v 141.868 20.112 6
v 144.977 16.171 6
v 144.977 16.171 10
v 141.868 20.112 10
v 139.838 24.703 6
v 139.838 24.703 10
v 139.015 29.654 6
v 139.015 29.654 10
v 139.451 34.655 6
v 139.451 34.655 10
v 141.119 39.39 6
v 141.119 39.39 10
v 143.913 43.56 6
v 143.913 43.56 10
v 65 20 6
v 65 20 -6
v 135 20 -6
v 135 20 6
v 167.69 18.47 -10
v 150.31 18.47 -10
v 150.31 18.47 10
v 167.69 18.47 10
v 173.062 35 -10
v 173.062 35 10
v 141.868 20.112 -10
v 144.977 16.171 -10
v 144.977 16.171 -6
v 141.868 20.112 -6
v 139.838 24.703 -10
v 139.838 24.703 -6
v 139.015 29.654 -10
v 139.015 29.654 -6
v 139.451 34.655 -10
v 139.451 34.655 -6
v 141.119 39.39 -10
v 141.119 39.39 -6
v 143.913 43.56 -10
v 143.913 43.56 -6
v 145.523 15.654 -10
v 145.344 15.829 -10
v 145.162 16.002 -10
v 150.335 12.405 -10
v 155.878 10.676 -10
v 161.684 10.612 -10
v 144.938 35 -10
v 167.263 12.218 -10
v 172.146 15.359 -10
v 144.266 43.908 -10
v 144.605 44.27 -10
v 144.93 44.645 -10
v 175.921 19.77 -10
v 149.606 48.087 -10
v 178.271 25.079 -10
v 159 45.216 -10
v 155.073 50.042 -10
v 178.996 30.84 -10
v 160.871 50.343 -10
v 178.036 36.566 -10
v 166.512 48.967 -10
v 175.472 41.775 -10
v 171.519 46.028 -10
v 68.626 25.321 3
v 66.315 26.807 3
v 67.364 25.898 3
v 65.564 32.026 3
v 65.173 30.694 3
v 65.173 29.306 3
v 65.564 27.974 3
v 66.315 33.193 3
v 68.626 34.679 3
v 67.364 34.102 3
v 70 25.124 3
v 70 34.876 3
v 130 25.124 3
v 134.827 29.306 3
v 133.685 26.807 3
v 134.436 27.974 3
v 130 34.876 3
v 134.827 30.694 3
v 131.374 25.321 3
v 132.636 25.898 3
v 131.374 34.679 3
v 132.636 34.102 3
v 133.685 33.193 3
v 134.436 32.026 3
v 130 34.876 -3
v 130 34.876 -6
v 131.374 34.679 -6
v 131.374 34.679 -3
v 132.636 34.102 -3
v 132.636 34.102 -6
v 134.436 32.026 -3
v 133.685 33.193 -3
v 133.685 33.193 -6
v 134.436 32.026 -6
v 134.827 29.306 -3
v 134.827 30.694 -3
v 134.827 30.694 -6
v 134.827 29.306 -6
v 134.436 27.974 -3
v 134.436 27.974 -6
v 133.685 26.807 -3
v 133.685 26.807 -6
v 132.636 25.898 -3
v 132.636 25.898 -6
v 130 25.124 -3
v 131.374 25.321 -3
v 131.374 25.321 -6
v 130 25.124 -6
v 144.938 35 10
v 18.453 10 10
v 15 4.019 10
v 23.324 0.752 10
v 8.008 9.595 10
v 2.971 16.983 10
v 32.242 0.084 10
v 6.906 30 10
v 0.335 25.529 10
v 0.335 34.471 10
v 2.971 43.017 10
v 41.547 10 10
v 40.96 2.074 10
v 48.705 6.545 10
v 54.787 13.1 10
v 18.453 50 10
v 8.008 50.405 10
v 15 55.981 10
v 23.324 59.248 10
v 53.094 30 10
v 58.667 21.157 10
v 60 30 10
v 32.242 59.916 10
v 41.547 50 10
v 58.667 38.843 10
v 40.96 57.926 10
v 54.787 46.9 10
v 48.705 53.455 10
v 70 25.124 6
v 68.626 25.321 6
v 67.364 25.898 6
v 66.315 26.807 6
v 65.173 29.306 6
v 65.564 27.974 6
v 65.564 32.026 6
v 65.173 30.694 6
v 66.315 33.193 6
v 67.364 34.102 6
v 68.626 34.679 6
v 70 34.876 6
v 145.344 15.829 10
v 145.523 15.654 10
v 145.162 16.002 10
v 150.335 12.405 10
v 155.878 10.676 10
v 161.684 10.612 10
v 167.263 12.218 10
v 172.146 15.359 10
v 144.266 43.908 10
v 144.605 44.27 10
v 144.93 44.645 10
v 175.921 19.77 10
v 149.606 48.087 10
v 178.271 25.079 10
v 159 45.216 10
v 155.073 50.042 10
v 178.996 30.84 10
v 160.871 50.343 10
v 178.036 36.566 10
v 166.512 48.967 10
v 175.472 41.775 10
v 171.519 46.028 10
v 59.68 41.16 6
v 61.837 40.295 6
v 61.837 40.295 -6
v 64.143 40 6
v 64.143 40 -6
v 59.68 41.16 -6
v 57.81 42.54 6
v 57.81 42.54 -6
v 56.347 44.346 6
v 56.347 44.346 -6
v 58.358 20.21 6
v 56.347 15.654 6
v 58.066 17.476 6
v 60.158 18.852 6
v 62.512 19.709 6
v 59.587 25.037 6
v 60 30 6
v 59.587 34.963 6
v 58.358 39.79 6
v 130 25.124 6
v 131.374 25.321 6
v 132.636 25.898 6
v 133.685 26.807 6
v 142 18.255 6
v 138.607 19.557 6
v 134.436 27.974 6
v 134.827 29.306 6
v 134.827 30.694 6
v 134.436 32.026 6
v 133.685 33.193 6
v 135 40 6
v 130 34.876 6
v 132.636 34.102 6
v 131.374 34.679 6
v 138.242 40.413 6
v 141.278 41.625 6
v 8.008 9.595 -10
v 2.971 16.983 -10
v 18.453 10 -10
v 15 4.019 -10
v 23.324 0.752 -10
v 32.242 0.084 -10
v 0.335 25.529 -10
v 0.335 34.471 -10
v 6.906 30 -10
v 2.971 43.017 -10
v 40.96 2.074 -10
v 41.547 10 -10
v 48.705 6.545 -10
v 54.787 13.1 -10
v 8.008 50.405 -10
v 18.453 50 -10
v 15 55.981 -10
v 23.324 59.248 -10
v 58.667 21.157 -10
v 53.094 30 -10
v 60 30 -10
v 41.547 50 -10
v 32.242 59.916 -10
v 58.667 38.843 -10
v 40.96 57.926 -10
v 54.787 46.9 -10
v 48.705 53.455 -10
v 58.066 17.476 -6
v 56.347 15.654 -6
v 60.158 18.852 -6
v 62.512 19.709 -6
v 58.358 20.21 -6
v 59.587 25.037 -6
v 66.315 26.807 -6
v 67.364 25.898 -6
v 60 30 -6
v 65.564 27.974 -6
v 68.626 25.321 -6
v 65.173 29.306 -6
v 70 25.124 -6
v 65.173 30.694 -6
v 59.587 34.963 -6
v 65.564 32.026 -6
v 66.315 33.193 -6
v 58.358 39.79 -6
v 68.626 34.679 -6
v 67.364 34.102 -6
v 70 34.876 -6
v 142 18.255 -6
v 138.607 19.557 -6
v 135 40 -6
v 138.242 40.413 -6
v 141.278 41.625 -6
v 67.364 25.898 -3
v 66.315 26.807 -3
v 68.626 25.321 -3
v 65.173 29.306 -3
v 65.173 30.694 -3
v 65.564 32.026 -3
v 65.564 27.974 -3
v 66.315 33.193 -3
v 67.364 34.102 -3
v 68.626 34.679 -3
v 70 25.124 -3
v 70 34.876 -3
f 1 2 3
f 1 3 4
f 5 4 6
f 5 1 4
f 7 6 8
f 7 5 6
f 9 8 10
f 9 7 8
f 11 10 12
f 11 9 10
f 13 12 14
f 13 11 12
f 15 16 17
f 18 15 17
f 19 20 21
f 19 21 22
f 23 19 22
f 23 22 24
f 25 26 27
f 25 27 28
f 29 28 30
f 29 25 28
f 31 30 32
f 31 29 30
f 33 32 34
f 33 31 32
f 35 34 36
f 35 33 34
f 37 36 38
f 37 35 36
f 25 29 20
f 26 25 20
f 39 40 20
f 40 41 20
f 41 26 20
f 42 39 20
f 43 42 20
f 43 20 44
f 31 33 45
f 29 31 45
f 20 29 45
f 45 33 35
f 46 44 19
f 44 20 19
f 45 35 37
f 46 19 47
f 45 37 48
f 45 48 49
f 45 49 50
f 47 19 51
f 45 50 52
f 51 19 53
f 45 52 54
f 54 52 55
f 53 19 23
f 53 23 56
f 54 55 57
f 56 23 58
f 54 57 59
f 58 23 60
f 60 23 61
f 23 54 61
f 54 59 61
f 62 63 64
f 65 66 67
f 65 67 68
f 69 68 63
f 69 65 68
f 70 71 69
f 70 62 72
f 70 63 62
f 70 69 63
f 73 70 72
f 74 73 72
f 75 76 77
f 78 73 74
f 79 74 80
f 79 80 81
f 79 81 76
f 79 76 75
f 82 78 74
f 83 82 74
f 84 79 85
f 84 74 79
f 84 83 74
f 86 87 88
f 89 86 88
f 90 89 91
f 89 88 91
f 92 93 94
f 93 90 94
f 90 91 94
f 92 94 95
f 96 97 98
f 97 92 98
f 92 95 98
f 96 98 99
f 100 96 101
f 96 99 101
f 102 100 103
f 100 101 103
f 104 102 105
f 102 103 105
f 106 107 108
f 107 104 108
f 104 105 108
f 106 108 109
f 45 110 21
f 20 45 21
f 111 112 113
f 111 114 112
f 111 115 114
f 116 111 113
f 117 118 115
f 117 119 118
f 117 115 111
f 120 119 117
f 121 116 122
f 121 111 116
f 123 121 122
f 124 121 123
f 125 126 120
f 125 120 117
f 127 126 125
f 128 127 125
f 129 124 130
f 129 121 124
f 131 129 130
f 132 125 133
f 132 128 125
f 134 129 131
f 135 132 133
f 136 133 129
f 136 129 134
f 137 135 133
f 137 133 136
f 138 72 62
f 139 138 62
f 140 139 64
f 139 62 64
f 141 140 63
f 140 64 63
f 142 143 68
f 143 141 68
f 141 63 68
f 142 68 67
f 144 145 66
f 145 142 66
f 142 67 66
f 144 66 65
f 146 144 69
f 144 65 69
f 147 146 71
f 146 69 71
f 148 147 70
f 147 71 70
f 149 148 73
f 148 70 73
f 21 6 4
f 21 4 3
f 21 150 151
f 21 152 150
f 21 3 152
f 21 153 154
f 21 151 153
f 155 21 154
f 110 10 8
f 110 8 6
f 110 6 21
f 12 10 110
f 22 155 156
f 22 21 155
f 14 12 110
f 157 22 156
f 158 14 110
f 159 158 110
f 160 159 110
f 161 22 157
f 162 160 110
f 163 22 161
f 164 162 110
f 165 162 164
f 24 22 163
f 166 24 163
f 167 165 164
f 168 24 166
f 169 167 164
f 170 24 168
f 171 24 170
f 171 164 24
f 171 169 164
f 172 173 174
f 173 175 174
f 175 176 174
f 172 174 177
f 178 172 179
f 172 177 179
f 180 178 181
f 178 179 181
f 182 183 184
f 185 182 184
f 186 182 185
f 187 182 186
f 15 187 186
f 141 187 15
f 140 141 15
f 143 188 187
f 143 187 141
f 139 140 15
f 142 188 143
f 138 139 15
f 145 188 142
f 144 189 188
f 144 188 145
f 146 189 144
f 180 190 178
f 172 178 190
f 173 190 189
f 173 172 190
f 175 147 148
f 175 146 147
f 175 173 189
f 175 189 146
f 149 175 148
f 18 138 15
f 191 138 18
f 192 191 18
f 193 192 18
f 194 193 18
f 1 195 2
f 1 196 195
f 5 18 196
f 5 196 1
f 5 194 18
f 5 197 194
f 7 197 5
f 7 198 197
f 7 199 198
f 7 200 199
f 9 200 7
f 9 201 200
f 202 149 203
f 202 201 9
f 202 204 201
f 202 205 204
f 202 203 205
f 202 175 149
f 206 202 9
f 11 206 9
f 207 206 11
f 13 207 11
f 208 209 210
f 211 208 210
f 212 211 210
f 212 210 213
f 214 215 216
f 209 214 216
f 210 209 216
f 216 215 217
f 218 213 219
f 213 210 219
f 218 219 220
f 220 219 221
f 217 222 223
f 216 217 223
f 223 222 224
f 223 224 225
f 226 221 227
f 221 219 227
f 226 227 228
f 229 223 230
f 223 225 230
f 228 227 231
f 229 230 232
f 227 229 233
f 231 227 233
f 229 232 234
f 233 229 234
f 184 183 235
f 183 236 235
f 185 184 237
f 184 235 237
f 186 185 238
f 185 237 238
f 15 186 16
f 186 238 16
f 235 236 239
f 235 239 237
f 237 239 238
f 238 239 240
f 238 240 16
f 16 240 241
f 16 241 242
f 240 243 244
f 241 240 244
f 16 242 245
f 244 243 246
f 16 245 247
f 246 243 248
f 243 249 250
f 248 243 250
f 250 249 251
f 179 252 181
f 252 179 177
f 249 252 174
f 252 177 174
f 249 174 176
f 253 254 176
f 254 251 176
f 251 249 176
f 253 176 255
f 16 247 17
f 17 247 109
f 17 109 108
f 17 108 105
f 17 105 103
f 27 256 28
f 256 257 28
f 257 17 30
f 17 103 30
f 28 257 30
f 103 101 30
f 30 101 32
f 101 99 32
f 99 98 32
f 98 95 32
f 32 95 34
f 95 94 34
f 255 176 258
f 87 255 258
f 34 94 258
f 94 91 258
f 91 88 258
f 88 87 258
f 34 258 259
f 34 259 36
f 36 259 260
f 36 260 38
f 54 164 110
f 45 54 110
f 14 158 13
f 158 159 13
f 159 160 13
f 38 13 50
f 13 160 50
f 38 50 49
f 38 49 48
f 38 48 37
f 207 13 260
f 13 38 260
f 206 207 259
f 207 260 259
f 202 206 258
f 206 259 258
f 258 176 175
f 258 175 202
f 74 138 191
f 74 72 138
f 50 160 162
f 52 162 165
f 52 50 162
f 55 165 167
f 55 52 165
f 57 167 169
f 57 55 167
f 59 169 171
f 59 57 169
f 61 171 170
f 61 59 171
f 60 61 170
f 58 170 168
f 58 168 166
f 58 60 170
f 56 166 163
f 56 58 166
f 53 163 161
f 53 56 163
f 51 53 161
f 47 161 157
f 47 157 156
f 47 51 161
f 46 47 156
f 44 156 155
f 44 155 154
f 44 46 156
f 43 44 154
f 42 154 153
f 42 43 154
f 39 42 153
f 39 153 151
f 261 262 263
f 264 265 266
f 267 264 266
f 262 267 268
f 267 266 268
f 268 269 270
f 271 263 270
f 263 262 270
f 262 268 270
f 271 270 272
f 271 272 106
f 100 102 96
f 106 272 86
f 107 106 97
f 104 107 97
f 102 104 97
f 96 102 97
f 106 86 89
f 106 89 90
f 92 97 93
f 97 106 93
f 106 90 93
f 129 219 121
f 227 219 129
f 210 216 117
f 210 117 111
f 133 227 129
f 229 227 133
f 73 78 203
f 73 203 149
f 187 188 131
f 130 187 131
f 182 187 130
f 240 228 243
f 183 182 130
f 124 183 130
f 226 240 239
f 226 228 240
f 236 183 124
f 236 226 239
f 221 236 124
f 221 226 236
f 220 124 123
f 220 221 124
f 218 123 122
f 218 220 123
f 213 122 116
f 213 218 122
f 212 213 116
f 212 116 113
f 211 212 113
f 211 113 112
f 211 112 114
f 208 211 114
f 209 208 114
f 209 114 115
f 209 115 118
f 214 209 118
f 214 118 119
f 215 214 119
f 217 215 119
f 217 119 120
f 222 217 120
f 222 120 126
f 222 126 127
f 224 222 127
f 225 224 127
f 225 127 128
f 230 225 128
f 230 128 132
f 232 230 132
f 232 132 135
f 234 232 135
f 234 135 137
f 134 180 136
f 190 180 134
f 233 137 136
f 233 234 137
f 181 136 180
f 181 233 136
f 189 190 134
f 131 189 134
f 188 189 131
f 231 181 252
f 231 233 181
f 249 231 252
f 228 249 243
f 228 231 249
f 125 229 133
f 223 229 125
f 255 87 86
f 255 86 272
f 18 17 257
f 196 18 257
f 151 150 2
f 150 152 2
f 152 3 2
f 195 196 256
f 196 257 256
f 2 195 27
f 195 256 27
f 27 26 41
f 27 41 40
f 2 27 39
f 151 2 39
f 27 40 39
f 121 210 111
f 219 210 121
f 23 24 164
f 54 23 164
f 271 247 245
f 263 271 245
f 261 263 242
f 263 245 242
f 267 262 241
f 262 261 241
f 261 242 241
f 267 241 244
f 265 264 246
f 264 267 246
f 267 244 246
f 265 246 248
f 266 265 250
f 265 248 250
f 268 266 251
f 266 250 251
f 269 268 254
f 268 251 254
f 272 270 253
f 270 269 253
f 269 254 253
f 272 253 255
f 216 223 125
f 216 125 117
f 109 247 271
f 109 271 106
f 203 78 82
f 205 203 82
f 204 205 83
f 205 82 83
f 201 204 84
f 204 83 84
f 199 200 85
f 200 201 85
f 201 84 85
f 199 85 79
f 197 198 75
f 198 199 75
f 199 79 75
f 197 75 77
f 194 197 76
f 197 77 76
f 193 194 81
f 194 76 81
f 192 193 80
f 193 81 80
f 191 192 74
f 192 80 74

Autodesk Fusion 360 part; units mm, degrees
sketch "Sketch1" plane through (0, 0, 0) normal (0, 0, 1) x (1, 0, 0)
  circle A0 centre (30, 30) radius 30
  line L0 (64.143, 40) -> (135, 40)
  line L1 (65, 20) -> (135, 20)
  circle A1 centre (159, 30.4309) radius 20
  line L2 (130, 34.8765) -> (70, 34.8765)
  arc A2 (70, 34.8765) -> (70, 25.1235) centre (70, 30) ccw
  line L3 (70, 25.1235) -> (130, 25.1235)
  arc A3 (130, 25.1235) -> (130, 34.8765) centre (130, 30) ccw
  line L4 (130, 30) -> (70, 30) construction
  line L5 (18.453, 50) -> (6.906, 30)
  line L6 (6.906, 30) -> (18.453, 10)
  line L7 (18.453, 10) -> (41.547, 10)
  line L8 (41.547, 10) -> (53.094, 30)
  line L9 (53.094, 30) -> (41.547, 50)
  line L10 (41.547, 50) -> (18.453, 50)
  line L11 (159, 45.216) -> (144.9385, 34.9998)
  line L12 (144.9385, 34.9998) -> (150.3095, 18.4695)
  line L13 (150.3095, 18.4695) -> (167.6905, 18.4695)
  line L14 (167.6905, 18.4695) -> (173.0615, 34.9998)
  line L15 (173.0615, 34.9998) -> (159, 45.216)
  arc A4 (56.3472, 44.3465) -> (64.143, 40) centre (64.143, 49.1644) ccw
  arc A5 (65, 20) -> (56.3472, 15.6535) centre (65, 9.2141) ccw
  arc A6 (145.5231, 15.6535) -> (135, 20) centre (135, 5.0883) ccw
  arc A7 (135, 40) -> (144.9303, 44.6452) centre (135, 52.937) ccw
  point P0 (30, 30)
  point P1 (159, 30.4309)
  point P2 (159, 45.216)
  point P3 (159, 30.4309)
extrude "Extrude1" add sketch "Sketch1" along normal mid plane 12 contours A0 L0 L1 A1 A4 A5 A6 A7
extrude "Extrude2" add sketch "Sketch1" along normal mid plane 20 contours A0 | A1 A6 A7
extrude "Extrude3" add sketch "Sketch1" along normal mid plane 6 contours L2 A2 L3 A3
